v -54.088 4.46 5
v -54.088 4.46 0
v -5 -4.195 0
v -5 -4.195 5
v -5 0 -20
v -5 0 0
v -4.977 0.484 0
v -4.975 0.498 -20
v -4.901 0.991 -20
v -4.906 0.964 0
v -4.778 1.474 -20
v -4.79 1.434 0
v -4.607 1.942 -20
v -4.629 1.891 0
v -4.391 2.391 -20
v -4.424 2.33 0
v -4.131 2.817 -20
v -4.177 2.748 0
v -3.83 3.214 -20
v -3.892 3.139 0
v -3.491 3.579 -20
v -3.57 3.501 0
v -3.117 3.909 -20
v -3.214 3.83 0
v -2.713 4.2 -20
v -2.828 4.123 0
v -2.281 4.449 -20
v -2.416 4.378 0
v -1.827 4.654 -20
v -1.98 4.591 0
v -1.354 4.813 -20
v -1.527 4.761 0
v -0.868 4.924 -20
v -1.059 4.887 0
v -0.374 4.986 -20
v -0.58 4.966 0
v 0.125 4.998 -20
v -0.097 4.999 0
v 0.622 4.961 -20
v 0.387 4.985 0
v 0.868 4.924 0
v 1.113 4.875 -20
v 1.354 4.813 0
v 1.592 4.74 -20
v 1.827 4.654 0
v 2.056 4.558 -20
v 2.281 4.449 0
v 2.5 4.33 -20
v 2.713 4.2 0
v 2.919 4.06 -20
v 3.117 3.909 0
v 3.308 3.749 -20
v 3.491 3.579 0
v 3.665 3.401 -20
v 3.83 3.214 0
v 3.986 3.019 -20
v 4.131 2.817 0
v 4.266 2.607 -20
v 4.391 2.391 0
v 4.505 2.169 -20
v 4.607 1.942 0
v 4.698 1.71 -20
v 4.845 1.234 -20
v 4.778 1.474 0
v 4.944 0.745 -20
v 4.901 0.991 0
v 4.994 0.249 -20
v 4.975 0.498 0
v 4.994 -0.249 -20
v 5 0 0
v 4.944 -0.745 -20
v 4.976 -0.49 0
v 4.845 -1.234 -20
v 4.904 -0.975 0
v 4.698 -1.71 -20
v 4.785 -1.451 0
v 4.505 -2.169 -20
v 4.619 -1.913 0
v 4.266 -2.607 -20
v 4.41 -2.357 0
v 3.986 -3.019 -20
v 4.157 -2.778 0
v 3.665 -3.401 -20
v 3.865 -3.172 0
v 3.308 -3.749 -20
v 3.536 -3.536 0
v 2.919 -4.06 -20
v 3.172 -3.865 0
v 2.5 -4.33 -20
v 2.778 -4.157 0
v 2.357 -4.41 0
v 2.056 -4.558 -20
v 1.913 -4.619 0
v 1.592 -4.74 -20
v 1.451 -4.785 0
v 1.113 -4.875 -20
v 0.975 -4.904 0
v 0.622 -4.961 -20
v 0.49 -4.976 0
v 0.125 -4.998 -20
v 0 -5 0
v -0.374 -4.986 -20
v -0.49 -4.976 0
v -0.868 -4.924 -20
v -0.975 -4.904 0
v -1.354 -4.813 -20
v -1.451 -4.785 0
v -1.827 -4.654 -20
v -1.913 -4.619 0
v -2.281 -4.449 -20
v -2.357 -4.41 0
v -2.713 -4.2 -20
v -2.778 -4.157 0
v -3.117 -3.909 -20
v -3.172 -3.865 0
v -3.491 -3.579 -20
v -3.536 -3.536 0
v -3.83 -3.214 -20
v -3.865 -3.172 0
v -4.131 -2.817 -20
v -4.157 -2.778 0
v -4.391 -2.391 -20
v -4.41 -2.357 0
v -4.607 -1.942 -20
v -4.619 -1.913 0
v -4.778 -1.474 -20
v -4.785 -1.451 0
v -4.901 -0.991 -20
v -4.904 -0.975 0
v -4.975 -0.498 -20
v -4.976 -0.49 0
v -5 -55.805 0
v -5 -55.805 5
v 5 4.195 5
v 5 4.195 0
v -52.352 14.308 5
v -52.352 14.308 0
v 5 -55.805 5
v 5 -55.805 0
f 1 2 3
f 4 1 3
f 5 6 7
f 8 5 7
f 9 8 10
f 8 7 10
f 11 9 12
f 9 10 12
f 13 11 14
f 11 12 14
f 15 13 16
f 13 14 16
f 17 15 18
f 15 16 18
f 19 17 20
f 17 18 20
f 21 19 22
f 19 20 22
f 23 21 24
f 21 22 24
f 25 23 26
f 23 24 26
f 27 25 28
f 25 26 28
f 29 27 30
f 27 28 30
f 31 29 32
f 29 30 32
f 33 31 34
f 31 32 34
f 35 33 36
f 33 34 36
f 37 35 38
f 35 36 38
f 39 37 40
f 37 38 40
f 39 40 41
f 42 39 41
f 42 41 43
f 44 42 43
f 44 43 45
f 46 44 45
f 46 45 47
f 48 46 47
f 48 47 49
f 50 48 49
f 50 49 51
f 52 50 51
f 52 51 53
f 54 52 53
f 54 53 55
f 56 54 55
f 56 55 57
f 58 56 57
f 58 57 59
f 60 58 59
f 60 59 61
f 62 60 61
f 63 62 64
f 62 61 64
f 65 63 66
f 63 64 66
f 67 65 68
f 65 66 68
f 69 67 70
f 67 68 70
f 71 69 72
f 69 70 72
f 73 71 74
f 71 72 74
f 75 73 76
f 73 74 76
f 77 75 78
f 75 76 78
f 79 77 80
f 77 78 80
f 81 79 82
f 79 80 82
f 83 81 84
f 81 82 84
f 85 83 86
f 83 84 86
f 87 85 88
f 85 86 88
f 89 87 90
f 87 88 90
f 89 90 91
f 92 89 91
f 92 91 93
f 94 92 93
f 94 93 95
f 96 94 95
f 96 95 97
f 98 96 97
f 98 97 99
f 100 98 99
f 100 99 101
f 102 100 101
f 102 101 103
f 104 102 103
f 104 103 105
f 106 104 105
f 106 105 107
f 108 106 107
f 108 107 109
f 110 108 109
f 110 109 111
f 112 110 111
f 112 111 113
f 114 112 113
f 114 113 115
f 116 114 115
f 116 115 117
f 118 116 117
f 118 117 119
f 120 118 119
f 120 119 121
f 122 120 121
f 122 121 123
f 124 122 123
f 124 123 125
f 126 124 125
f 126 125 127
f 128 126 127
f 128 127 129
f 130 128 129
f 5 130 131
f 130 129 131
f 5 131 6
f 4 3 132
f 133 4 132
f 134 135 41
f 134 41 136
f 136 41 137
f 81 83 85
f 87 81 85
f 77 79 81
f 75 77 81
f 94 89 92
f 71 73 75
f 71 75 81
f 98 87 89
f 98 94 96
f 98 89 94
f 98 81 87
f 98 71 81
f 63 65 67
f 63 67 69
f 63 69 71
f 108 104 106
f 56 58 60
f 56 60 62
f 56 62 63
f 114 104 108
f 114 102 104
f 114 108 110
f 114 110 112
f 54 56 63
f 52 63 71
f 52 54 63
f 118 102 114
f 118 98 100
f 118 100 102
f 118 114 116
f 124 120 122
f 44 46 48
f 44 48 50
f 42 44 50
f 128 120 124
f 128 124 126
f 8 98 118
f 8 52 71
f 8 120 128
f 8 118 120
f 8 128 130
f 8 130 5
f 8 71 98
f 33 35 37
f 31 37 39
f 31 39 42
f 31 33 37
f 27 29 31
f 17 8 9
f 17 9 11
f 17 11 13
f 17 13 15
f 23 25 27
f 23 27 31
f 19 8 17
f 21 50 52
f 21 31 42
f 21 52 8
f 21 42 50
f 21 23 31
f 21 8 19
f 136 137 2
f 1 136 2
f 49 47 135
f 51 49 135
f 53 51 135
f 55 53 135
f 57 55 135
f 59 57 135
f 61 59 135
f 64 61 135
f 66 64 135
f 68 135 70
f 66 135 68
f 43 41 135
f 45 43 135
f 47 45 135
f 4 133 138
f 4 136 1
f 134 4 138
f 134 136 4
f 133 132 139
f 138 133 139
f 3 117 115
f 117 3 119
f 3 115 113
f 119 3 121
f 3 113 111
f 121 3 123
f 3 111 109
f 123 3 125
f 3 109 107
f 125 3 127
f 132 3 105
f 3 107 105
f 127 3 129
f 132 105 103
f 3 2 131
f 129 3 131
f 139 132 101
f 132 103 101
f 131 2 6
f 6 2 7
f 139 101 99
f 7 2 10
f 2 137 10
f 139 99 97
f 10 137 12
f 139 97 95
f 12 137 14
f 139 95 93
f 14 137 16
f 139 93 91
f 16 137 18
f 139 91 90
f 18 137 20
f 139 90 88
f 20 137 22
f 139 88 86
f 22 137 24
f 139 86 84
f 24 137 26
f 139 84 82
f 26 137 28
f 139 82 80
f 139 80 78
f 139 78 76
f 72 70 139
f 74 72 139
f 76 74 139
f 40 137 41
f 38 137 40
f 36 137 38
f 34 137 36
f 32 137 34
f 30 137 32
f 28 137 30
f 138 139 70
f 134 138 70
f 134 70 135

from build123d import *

# Parameters (mm, degrees)
BOSS_EXTRU_1_DEPTH = 5
ESQUISSE2_R        = 5
BOSS_EXTRU_2_DEPTH = 20


with BuildPart() as part:
    # Esquisse1 → Boss.-Extru.1 (new body)
    with BuildSketch(Plane.XY):
        Polygon((5, -5.958767963), (-5, -4.195498156), (-5, -55.804501844), (5, -55.804501844), align=None)
        Polygon((-52.351983404, 14.308200227), (-54.088465181, 4.460122697), (-5, -4.195498156), (5, -5.958767963), (5, 4.195498156), align=None)
    extrude(amount=BOSS_EXTRU_1_DEPTH)

    # Esquisse2 → Boss.-Extru.2 (add)
    with BuildSketch(Plane(origin=(0, 0, 0), x_dir=(-1, 0, 0), z_dir=(0, 0, -1))):
        Circle(ESQUISSE2_R)
    extrude(amount=BOSS_EXTRU_2_DEPTH)


solid = part.part
